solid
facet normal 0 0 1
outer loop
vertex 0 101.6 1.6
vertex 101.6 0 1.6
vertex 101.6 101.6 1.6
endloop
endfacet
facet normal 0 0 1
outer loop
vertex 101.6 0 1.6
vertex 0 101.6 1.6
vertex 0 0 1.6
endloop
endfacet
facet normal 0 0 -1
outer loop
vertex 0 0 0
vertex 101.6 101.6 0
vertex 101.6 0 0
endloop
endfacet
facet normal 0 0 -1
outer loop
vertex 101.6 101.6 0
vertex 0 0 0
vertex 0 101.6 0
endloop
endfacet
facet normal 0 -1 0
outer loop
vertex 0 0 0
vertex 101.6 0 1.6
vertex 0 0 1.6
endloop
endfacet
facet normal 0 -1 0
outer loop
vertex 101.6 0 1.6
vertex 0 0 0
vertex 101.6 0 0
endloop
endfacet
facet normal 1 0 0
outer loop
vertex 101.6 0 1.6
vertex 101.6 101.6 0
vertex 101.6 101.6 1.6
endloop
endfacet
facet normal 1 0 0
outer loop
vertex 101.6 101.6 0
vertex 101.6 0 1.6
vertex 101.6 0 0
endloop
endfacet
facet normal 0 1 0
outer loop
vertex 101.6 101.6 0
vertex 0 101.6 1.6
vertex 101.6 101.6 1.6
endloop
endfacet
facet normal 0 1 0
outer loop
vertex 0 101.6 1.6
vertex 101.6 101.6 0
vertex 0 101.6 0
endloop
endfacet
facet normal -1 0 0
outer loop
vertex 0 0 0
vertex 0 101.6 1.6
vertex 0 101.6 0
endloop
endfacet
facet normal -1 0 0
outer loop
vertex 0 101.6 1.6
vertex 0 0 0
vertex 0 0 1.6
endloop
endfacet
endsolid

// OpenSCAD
// The white backing for the scope's AprilTag print (scope_tag_black_id0.scad),
// a plain filled square to lay the black cells on (2026-11-05).
//
// Same size as the whole tag: 4" (101.6 mm) square, which is the 8 x 8 black
// region (81.28 mm) plus one module (10.16 mm) of white quiet zone on every
// side. Center the black piece on it so that border is even all round; the
// detector needs at least one module of white on every side to find the
// tag's outline.
//
// Printing:
//   * White filament, matte face up (same reason as the black piece: a glossy
//     face throws the IR illuminator's highlight back at the lens).
//   * White is fine in the near infrared for nearly every filament, but check
//     the finished tag under the camera at night before you mount it.

tag_size  = 101.6;            // whole tag including the white quiet zone (4")
thickness = 1.6;              // mm

cube([tag_size, tag_size, thickness]);
